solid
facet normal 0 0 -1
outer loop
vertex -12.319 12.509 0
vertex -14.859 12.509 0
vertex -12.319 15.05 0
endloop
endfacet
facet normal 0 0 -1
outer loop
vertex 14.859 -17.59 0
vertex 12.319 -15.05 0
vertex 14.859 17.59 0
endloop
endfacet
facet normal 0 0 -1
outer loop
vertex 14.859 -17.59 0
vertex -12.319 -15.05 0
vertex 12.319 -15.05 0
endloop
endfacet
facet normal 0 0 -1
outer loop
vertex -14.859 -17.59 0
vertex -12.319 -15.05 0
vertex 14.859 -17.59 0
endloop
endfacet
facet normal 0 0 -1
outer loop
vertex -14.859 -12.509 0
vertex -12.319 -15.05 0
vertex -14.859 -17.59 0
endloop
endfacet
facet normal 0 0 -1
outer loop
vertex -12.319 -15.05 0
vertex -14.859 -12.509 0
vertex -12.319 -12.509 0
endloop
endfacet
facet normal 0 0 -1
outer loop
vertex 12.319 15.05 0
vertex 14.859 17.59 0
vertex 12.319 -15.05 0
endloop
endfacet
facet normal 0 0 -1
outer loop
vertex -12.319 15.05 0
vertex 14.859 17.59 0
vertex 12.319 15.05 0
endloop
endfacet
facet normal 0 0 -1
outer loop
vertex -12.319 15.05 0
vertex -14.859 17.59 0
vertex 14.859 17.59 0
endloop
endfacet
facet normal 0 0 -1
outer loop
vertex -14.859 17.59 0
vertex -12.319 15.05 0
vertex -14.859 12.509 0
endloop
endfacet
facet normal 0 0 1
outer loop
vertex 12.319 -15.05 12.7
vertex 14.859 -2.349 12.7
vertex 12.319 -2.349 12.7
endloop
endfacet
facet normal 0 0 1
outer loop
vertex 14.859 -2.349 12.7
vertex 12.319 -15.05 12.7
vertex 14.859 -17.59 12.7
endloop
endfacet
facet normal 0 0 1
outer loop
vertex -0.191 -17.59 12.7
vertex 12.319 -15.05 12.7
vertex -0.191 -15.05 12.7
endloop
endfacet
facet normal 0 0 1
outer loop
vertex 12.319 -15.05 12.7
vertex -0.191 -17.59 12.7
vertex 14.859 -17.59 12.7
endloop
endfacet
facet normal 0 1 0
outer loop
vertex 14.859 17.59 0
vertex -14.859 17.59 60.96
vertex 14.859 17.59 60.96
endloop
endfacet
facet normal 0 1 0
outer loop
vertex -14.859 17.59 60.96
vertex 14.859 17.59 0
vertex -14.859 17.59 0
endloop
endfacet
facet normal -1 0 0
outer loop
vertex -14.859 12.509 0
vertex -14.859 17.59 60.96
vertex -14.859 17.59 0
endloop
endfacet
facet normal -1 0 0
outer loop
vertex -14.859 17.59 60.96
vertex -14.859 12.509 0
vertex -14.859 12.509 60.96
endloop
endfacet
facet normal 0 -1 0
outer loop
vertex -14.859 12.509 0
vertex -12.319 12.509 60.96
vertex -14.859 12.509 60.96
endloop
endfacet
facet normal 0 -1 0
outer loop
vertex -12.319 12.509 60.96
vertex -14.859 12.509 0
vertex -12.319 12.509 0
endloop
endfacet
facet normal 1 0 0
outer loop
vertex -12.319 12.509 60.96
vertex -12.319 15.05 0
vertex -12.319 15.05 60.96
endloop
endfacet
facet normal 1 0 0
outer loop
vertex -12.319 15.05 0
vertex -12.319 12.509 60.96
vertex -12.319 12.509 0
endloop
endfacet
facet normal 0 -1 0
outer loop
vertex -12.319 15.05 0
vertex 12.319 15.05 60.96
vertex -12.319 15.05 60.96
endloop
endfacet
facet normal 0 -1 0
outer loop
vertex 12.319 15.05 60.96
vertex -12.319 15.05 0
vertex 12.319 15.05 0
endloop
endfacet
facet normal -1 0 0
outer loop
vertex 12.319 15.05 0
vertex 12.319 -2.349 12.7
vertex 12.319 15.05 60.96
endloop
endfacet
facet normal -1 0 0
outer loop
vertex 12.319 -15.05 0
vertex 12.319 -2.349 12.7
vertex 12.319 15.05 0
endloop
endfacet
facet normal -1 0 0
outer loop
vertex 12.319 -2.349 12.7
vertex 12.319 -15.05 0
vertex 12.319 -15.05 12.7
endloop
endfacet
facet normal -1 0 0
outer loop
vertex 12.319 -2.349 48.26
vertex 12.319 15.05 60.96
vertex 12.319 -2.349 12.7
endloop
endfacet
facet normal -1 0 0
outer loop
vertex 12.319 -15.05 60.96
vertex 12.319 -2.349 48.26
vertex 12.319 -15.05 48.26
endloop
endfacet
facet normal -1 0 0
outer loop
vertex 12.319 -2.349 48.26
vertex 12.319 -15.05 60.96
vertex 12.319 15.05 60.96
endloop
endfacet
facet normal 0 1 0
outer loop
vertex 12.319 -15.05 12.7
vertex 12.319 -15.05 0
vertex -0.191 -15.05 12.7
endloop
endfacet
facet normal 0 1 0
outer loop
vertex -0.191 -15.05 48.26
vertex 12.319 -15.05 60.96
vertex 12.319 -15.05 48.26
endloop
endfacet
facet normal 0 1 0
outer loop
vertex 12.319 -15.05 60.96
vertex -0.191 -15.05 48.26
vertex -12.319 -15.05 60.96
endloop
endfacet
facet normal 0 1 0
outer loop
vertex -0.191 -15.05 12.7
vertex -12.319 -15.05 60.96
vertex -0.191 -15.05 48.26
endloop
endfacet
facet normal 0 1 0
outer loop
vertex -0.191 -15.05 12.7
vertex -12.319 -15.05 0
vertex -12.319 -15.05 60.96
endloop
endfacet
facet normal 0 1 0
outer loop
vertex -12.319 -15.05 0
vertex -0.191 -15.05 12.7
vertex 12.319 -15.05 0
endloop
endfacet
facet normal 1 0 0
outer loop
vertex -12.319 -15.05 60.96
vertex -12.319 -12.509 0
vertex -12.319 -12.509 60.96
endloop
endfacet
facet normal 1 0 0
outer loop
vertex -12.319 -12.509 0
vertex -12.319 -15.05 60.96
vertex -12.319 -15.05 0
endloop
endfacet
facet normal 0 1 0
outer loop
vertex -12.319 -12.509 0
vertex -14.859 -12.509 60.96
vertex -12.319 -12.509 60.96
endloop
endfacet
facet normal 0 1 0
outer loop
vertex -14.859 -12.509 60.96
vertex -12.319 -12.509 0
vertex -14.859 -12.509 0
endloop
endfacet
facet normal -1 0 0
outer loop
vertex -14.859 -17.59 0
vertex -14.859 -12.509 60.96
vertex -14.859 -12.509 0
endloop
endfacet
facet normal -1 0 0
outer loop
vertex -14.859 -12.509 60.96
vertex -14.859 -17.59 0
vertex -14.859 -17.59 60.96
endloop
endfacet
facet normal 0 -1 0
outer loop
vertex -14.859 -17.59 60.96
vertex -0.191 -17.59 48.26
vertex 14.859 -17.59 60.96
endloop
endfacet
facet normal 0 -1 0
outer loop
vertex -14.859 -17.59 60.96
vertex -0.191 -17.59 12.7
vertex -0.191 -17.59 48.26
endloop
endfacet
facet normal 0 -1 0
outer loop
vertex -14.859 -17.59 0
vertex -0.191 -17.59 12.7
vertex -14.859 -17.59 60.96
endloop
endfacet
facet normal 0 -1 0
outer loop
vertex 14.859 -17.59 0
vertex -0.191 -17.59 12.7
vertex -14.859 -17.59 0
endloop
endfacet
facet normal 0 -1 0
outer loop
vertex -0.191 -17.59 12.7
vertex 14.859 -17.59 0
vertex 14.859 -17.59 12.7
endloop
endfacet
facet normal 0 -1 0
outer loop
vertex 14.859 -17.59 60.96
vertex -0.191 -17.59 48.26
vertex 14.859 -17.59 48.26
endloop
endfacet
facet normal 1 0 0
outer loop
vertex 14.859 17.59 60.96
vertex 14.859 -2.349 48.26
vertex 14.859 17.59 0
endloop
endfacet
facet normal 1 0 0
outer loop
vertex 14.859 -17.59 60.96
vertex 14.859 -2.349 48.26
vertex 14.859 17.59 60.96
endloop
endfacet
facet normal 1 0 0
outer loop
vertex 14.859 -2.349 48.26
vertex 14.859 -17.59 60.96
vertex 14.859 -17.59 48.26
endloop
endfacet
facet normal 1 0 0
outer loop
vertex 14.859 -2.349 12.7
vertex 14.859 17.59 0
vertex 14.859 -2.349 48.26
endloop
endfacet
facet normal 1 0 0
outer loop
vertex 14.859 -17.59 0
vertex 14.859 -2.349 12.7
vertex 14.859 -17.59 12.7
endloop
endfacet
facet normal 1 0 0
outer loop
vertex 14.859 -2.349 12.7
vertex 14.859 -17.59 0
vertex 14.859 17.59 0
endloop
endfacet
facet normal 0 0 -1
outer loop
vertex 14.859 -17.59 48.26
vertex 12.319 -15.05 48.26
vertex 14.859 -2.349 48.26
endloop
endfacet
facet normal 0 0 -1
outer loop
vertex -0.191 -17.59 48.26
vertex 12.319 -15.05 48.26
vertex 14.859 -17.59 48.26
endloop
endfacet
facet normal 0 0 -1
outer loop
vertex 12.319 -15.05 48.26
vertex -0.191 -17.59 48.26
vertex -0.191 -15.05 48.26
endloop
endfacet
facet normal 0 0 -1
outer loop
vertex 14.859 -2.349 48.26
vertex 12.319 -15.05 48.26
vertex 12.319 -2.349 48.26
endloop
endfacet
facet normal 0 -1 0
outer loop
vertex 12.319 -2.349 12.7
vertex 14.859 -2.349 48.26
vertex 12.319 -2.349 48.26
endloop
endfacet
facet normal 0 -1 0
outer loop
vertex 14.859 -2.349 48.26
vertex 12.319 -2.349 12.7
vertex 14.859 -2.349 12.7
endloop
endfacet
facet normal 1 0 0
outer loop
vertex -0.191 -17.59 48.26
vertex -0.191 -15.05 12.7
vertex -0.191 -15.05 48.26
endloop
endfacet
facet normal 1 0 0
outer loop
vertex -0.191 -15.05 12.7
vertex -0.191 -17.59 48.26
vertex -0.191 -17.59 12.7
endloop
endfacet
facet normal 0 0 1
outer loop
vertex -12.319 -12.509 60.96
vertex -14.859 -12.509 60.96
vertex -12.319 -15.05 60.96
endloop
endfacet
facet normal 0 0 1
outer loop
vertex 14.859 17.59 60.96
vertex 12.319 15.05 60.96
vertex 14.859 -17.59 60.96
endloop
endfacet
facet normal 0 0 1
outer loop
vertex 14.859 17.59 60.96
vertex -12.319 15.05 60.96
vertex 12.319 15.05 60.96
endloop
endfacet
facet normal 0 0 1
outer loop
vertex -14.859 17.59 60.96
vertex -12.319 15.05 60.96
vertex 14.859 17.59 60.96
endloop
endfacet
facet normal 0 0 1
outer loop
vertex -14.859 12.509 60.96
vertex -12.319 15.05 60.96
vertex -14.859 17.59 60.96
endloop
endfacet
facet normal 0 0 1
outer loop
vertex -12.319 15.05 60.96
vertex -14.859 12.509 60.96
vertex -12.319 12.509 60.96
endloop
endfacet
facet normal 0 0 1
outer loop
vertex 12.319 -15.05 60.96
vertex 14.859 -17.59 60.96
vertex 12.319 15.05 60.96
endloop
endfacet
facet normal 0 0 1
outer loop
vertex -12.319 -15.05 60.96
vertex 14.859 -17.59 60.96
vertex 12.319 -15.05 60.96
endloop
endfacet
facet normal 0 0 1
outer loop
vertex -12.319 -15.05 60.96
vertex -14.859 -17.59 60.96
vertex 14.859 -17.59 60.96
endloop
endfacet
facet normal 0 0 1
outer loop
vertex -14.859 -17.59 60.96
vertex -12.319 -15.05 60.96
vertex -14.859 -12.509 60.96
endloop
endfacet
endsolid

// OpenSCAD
ViewScale = [0.0254, 0.0254, 0.0254];

module brace1()
{
    difference(){
        square([1170, 1385], center=true);
        square([970, 1185], center=true);
        translate([-1070/2, 0, 0])
        square([150, 985], center=true);
    }
}

module brace2()
{
    difference(){
        square([1170, 1385], center=true);
        square([970, 1185], center=true);
        translate([-1070/2, 0, 0])
        square([150, 985], center=true);
        translate([(1185-600)/2, -(1185-600+200)/2, 0])
        square([600, 600], center=true);
    }
}

scale(ViewScale)
{
    linear_extrude(500)
    brace1();

    translate([0, 0, 500])
    linear_extrude(1400)
    brace2();

    translate([0, 0, 1900])
    linear_extrude(500)
    brace1();
}
